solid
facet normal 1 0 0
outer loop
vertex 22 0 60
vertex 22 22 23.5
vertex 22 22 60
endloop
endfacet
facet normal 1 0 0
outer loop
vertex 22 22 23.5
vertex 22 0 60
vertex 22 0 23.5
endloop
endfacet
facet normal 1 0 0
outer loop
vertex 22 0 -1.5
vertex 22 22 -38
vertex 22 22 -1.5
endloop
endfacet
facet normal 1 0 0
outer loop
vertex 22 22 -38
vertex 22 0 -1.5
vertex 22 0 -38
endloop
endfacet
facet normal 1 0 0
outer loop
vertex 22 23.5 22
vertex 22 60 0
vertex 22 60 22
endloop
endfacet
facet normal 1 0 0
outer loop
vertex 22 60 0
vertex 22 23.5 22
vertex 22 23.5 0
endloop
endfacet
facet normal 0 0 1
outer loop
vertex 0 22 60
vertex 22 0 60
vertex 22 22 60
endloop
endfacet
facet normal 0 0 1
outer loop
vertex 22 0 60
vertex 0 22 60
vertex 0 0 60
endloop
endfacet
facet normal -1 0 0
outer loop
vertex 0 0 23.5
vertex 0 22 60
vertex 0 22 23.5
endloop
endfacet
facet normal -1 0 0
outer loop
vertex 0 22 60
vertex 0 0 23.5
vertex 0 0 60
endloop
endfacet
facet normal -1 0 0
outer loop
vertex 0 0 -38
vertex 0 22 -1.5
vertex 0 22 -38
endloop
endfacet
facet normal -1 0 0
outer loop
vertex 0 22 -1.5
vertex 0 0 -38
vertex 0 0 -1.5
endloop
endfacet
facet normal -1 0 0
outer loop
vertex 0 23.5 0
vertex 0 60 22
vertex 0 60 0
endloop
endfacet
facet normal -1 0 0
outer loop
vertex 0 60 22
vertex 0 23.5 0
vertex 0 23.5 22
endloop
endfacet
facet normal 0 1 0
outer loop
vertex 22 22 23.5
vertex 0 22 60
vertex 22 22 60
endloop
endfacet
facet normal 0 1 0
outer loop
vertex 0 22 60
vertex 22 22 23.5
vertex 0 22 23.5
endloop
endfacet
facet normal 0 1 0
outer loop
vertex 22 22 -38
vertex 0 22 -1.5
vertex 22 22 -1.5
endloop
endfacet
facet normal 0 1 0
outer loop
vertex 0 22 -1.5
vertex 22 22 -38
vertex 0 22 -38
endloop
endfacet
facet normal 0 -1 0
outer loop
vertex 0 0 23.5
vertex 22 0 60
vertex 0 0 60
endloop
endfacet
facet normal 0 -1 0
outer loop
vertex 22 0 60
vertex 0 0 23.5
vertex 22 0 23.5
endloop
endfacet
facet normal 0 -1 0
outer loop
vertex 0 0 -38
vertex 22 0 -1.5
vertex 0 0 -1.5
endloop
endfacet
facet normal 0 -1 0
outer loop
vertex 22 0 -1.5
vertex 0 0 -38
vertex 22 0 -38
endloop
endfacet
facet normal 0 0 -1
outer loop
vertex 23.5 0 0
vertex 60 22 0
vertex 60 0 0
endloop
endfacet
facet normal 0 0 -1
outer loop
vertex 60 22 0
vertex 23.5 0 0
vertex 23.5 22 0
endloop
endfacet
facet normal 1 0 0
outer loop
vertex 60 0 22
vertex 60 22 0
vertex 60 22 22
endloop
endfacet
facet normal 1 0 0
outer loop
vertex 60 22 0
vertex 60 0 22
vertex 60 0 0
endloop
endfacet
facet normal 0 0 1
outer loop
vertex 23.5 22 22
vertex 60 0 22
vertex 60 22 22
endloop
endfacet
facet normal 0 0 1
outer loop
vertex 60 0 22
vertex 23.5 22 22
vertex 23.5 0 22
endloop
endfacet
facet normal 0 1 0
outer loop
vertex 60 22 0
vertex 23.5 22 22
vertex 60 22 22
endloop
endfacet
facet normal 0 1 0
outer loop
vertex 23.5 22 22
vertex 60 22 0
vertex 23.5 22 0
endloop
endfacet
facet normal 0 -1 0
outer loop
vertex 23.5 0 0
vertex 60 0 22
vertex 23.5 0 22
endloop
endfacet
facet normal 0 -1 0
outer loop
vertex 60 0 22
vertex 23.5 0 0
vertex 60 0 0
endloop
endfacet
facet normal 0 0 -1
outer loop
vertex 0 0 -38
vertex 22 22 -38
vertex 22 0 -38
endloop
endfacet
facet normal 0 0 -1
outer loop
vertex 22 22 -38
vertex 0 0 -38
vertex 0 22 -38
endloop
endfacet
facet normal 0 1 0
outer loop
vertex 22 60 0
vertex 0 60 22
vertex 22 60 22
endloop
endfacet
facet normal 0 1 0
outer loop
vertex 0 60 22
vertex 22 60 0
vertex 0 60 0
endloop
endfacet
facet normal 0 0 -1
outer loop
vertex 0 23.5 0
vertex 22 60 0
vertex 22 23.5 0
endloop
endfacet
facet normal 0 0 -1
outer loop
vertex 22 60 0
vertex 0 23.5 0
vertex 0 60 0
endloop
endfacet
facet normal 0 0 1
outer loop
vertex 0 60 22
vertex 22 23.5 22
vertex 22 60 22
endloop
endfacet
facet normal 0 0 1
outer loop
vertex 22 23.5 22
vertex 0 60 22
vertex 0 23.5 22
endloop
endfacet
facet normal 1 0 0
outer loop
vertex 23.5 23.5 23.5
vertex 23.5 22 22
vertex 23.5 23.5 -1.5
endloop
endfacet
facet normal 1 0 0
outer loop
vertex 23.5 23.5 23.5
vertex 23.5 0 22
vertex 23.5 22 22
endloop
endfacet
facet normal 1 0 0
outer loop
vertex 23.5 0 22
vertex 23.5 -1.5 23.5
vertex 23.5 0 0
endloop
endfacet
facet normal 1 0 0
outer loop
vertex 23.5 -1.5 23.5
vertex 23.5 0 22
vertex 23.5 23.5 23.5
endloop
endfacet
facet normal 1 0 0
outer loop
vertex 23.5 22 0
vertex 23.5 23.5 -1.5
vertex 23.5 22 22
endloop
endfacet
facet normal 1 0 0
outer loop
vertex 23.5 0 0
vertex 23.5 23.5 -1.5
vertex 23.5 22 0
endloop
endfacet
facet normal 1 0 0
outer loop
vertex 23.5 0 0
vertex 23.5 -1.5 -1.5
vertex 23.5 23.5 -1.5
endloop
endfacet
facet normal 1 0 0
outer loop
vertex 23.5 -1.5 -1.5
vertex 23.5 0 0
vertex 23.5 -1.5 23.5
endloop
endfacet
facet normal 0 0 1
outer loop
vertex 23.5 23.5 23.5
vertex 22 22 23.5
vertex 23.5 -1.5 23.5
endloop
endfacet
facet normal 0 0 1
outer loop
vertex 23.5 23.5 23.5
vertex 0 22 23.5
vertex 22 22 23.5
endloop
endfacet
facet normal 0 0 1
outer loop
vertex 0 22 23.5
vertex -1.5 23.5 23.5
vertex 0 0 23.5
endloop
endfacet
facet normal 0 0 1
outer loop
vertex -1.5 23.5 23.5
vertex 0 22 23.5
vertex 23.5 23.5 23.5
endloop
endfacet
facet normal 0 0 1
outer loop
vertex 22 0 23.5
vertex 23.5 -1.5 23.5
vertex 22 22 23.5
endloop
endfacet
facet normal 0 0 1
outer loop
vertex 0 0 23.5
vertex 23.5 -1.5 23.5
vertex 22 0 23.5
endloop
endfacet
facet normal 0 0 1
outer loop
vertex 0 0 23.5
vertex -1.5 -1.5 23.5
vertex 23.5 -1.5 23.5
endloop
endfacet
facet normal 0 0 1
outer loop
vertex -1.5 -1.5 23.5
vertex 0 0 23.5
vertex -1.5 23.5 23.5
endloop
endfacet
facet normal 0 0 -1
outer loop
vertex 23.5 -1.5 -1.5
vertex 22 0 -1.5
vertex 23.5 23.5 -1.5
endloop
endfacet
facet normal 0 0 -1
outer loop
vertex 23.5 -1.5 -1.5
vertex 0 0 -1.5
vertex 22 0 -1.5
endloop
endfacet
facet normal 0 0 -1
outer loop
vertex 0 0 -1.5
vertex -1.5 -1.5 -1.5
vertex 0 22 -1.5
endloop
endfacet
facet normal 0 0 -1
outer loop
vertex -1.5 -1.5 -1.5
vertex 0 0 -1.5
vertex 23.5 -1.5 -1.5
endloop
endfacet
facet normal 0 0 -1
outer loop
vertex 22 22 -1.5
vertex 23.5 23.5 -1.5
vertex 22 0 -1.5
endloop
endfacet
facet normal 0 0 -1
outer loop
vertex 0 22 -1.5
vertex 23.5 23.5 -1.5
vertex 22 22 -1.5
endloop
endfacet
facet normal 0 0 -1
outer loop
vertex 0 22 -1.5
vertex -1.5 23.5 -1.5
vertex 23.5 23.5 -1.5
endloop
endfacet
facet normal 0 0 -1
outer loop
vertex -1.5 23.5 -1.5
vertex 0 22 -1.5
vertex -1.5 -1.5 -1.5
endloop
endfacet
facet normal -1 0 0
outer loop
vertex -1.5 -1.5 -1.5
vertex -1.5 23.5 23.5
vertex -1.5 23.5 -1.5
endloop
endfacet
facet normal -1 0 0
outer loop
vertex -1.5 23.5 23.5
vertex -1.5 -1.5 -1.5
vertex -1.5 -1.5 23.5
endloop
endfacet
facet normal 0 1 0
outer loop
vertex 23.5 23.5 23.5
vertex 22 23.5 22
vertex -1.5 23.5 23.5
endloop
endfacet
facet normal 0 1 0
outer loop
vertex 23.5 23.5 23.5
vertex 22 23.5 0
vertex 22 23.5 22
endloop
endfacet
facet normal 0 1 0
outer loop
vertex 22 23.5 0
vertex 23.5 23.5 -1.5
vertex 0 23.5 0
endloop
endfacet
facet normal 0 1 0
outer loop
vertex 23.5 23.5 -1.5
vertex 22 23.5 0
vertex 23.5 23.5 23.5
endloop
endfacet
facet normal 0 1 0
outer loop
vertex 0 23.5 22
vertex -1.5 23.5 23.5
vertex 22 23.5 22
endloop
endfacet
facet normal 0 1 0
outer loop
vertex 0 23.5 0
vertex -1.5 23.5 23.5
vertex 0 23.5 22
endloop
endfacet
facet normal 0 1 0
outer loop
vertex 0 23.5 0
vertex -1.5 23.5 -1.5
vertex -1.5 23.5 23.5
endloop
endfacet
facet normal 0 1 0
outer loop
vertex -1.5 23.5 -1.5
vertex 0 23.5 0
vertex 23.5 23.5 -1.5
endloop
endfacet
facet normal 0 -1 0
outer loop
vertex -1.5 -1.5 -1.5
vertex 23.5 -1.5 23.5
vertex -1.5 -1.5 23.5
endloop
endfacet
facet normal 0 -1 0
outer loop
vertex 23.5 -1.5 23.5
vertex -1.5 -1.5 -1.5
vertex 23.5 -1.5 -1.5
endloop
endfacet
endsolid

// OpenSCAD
profile_thickness = 1.5;

dimensions = [22,22, 60]; // 
jackl_dimensions = [25,25,25];
type = "middle_part"; // [middle_part, end_part, upper_part, lower_part, connector_part]

$fn=50;

module base() {
    cube(dimensions);
    
//    translate([0,22/4,0]) cylinder(r=1, h=dimensions[2]);
//    translate([0,22/4*2,0]) cylinder(r=1, h=dimensions[2]);
//    translate([0,22/4*3,0]) cylinder(r=1, h=dimensions[2]);

}

module lower_part() {
    translate([profile_thickness,profile_thickness,0]) base();
    translate([0,profile_thickness,dimensions[0]]) rotate([0,90,0]) base();
    translate([dimensions[0],0,dimensions[0]]) rotate([0,180,0]) base();
    translate([profile_thickness,0,dimensions[0]]) rotate([-90,0,0]) base();

    translate([0,0,-profile_thickness]) cube(jackl_dimensions);
    translate([0,0,-dimensions[2]+dimensions[1]]) cube([jackl_dimensions[0], jackl_dimensions[1], dimensions[2]]);
}

//lower_part();

module middle_part() {
    translate([0,0,0]) base();
    translate([0,0,dimensions[0]]) rotate([0,90,0]) base();
    translate([dimensions[0],0,dimensions[0]]) rotate([0,180,0]) base();
    translate([0,0,dimensions[0]]) rotate([-90,0,0]) base();

    translate([-profile_thickness,-profile_thickness,-profile_thickness]) cube(jackl_dimensions);

}

//middle_part();

module upper_part() {
    translate([0,0,0]) base();
    translate([0,0,dimensions[0]]) rotate([0,90,0]) base();
    translate([0,0,dimensions[0]]) rotate([-90,0,0]) base();

    translate([-profile_thickness,-profile_thickness,-profile_thickness]) cube(jackl_dimensions);

}

module t_part() {
    translate([0,0,0]) base();
    translate([0,0,dimensions[0]]) rotate([0,90,0]) base();
    translate([dimensions[0],0,dimensions[0]]) rotate([0,180,0]) base();

    translate([-profile_thickness,-profile_thickness,-profile_thickness]) cube(jackl_dimensions);
}

module end_part() {
    cube([dimensions[0], dimensions[1], 12]);
    translate([-profile_thickness, -profile_thickness, -3]) cube([jackl_dimensions[0], jackl_dimensions[1], 3]);
}

module connector_part() {
    translate([0,0,0]) base();
    translate([dimensions[0],0,dimensions[0]]) rotate([0,180,0]) base();

    translate([-profile_thickness,-profile_thickness,-profile_thickness]) cube(jackl_dimensions);
}


if (type=="connector_part") {
    connector_part();
}
if (type=="end_part") {

    end_part();
}


if (type=="upper_part") {
    upper_part();
}

if (type=="lower_part") {
    lower_part();
}
if (type=="middle_part") {
    middle_part();
}
if (type=="t_part") {
    t_part();
}
